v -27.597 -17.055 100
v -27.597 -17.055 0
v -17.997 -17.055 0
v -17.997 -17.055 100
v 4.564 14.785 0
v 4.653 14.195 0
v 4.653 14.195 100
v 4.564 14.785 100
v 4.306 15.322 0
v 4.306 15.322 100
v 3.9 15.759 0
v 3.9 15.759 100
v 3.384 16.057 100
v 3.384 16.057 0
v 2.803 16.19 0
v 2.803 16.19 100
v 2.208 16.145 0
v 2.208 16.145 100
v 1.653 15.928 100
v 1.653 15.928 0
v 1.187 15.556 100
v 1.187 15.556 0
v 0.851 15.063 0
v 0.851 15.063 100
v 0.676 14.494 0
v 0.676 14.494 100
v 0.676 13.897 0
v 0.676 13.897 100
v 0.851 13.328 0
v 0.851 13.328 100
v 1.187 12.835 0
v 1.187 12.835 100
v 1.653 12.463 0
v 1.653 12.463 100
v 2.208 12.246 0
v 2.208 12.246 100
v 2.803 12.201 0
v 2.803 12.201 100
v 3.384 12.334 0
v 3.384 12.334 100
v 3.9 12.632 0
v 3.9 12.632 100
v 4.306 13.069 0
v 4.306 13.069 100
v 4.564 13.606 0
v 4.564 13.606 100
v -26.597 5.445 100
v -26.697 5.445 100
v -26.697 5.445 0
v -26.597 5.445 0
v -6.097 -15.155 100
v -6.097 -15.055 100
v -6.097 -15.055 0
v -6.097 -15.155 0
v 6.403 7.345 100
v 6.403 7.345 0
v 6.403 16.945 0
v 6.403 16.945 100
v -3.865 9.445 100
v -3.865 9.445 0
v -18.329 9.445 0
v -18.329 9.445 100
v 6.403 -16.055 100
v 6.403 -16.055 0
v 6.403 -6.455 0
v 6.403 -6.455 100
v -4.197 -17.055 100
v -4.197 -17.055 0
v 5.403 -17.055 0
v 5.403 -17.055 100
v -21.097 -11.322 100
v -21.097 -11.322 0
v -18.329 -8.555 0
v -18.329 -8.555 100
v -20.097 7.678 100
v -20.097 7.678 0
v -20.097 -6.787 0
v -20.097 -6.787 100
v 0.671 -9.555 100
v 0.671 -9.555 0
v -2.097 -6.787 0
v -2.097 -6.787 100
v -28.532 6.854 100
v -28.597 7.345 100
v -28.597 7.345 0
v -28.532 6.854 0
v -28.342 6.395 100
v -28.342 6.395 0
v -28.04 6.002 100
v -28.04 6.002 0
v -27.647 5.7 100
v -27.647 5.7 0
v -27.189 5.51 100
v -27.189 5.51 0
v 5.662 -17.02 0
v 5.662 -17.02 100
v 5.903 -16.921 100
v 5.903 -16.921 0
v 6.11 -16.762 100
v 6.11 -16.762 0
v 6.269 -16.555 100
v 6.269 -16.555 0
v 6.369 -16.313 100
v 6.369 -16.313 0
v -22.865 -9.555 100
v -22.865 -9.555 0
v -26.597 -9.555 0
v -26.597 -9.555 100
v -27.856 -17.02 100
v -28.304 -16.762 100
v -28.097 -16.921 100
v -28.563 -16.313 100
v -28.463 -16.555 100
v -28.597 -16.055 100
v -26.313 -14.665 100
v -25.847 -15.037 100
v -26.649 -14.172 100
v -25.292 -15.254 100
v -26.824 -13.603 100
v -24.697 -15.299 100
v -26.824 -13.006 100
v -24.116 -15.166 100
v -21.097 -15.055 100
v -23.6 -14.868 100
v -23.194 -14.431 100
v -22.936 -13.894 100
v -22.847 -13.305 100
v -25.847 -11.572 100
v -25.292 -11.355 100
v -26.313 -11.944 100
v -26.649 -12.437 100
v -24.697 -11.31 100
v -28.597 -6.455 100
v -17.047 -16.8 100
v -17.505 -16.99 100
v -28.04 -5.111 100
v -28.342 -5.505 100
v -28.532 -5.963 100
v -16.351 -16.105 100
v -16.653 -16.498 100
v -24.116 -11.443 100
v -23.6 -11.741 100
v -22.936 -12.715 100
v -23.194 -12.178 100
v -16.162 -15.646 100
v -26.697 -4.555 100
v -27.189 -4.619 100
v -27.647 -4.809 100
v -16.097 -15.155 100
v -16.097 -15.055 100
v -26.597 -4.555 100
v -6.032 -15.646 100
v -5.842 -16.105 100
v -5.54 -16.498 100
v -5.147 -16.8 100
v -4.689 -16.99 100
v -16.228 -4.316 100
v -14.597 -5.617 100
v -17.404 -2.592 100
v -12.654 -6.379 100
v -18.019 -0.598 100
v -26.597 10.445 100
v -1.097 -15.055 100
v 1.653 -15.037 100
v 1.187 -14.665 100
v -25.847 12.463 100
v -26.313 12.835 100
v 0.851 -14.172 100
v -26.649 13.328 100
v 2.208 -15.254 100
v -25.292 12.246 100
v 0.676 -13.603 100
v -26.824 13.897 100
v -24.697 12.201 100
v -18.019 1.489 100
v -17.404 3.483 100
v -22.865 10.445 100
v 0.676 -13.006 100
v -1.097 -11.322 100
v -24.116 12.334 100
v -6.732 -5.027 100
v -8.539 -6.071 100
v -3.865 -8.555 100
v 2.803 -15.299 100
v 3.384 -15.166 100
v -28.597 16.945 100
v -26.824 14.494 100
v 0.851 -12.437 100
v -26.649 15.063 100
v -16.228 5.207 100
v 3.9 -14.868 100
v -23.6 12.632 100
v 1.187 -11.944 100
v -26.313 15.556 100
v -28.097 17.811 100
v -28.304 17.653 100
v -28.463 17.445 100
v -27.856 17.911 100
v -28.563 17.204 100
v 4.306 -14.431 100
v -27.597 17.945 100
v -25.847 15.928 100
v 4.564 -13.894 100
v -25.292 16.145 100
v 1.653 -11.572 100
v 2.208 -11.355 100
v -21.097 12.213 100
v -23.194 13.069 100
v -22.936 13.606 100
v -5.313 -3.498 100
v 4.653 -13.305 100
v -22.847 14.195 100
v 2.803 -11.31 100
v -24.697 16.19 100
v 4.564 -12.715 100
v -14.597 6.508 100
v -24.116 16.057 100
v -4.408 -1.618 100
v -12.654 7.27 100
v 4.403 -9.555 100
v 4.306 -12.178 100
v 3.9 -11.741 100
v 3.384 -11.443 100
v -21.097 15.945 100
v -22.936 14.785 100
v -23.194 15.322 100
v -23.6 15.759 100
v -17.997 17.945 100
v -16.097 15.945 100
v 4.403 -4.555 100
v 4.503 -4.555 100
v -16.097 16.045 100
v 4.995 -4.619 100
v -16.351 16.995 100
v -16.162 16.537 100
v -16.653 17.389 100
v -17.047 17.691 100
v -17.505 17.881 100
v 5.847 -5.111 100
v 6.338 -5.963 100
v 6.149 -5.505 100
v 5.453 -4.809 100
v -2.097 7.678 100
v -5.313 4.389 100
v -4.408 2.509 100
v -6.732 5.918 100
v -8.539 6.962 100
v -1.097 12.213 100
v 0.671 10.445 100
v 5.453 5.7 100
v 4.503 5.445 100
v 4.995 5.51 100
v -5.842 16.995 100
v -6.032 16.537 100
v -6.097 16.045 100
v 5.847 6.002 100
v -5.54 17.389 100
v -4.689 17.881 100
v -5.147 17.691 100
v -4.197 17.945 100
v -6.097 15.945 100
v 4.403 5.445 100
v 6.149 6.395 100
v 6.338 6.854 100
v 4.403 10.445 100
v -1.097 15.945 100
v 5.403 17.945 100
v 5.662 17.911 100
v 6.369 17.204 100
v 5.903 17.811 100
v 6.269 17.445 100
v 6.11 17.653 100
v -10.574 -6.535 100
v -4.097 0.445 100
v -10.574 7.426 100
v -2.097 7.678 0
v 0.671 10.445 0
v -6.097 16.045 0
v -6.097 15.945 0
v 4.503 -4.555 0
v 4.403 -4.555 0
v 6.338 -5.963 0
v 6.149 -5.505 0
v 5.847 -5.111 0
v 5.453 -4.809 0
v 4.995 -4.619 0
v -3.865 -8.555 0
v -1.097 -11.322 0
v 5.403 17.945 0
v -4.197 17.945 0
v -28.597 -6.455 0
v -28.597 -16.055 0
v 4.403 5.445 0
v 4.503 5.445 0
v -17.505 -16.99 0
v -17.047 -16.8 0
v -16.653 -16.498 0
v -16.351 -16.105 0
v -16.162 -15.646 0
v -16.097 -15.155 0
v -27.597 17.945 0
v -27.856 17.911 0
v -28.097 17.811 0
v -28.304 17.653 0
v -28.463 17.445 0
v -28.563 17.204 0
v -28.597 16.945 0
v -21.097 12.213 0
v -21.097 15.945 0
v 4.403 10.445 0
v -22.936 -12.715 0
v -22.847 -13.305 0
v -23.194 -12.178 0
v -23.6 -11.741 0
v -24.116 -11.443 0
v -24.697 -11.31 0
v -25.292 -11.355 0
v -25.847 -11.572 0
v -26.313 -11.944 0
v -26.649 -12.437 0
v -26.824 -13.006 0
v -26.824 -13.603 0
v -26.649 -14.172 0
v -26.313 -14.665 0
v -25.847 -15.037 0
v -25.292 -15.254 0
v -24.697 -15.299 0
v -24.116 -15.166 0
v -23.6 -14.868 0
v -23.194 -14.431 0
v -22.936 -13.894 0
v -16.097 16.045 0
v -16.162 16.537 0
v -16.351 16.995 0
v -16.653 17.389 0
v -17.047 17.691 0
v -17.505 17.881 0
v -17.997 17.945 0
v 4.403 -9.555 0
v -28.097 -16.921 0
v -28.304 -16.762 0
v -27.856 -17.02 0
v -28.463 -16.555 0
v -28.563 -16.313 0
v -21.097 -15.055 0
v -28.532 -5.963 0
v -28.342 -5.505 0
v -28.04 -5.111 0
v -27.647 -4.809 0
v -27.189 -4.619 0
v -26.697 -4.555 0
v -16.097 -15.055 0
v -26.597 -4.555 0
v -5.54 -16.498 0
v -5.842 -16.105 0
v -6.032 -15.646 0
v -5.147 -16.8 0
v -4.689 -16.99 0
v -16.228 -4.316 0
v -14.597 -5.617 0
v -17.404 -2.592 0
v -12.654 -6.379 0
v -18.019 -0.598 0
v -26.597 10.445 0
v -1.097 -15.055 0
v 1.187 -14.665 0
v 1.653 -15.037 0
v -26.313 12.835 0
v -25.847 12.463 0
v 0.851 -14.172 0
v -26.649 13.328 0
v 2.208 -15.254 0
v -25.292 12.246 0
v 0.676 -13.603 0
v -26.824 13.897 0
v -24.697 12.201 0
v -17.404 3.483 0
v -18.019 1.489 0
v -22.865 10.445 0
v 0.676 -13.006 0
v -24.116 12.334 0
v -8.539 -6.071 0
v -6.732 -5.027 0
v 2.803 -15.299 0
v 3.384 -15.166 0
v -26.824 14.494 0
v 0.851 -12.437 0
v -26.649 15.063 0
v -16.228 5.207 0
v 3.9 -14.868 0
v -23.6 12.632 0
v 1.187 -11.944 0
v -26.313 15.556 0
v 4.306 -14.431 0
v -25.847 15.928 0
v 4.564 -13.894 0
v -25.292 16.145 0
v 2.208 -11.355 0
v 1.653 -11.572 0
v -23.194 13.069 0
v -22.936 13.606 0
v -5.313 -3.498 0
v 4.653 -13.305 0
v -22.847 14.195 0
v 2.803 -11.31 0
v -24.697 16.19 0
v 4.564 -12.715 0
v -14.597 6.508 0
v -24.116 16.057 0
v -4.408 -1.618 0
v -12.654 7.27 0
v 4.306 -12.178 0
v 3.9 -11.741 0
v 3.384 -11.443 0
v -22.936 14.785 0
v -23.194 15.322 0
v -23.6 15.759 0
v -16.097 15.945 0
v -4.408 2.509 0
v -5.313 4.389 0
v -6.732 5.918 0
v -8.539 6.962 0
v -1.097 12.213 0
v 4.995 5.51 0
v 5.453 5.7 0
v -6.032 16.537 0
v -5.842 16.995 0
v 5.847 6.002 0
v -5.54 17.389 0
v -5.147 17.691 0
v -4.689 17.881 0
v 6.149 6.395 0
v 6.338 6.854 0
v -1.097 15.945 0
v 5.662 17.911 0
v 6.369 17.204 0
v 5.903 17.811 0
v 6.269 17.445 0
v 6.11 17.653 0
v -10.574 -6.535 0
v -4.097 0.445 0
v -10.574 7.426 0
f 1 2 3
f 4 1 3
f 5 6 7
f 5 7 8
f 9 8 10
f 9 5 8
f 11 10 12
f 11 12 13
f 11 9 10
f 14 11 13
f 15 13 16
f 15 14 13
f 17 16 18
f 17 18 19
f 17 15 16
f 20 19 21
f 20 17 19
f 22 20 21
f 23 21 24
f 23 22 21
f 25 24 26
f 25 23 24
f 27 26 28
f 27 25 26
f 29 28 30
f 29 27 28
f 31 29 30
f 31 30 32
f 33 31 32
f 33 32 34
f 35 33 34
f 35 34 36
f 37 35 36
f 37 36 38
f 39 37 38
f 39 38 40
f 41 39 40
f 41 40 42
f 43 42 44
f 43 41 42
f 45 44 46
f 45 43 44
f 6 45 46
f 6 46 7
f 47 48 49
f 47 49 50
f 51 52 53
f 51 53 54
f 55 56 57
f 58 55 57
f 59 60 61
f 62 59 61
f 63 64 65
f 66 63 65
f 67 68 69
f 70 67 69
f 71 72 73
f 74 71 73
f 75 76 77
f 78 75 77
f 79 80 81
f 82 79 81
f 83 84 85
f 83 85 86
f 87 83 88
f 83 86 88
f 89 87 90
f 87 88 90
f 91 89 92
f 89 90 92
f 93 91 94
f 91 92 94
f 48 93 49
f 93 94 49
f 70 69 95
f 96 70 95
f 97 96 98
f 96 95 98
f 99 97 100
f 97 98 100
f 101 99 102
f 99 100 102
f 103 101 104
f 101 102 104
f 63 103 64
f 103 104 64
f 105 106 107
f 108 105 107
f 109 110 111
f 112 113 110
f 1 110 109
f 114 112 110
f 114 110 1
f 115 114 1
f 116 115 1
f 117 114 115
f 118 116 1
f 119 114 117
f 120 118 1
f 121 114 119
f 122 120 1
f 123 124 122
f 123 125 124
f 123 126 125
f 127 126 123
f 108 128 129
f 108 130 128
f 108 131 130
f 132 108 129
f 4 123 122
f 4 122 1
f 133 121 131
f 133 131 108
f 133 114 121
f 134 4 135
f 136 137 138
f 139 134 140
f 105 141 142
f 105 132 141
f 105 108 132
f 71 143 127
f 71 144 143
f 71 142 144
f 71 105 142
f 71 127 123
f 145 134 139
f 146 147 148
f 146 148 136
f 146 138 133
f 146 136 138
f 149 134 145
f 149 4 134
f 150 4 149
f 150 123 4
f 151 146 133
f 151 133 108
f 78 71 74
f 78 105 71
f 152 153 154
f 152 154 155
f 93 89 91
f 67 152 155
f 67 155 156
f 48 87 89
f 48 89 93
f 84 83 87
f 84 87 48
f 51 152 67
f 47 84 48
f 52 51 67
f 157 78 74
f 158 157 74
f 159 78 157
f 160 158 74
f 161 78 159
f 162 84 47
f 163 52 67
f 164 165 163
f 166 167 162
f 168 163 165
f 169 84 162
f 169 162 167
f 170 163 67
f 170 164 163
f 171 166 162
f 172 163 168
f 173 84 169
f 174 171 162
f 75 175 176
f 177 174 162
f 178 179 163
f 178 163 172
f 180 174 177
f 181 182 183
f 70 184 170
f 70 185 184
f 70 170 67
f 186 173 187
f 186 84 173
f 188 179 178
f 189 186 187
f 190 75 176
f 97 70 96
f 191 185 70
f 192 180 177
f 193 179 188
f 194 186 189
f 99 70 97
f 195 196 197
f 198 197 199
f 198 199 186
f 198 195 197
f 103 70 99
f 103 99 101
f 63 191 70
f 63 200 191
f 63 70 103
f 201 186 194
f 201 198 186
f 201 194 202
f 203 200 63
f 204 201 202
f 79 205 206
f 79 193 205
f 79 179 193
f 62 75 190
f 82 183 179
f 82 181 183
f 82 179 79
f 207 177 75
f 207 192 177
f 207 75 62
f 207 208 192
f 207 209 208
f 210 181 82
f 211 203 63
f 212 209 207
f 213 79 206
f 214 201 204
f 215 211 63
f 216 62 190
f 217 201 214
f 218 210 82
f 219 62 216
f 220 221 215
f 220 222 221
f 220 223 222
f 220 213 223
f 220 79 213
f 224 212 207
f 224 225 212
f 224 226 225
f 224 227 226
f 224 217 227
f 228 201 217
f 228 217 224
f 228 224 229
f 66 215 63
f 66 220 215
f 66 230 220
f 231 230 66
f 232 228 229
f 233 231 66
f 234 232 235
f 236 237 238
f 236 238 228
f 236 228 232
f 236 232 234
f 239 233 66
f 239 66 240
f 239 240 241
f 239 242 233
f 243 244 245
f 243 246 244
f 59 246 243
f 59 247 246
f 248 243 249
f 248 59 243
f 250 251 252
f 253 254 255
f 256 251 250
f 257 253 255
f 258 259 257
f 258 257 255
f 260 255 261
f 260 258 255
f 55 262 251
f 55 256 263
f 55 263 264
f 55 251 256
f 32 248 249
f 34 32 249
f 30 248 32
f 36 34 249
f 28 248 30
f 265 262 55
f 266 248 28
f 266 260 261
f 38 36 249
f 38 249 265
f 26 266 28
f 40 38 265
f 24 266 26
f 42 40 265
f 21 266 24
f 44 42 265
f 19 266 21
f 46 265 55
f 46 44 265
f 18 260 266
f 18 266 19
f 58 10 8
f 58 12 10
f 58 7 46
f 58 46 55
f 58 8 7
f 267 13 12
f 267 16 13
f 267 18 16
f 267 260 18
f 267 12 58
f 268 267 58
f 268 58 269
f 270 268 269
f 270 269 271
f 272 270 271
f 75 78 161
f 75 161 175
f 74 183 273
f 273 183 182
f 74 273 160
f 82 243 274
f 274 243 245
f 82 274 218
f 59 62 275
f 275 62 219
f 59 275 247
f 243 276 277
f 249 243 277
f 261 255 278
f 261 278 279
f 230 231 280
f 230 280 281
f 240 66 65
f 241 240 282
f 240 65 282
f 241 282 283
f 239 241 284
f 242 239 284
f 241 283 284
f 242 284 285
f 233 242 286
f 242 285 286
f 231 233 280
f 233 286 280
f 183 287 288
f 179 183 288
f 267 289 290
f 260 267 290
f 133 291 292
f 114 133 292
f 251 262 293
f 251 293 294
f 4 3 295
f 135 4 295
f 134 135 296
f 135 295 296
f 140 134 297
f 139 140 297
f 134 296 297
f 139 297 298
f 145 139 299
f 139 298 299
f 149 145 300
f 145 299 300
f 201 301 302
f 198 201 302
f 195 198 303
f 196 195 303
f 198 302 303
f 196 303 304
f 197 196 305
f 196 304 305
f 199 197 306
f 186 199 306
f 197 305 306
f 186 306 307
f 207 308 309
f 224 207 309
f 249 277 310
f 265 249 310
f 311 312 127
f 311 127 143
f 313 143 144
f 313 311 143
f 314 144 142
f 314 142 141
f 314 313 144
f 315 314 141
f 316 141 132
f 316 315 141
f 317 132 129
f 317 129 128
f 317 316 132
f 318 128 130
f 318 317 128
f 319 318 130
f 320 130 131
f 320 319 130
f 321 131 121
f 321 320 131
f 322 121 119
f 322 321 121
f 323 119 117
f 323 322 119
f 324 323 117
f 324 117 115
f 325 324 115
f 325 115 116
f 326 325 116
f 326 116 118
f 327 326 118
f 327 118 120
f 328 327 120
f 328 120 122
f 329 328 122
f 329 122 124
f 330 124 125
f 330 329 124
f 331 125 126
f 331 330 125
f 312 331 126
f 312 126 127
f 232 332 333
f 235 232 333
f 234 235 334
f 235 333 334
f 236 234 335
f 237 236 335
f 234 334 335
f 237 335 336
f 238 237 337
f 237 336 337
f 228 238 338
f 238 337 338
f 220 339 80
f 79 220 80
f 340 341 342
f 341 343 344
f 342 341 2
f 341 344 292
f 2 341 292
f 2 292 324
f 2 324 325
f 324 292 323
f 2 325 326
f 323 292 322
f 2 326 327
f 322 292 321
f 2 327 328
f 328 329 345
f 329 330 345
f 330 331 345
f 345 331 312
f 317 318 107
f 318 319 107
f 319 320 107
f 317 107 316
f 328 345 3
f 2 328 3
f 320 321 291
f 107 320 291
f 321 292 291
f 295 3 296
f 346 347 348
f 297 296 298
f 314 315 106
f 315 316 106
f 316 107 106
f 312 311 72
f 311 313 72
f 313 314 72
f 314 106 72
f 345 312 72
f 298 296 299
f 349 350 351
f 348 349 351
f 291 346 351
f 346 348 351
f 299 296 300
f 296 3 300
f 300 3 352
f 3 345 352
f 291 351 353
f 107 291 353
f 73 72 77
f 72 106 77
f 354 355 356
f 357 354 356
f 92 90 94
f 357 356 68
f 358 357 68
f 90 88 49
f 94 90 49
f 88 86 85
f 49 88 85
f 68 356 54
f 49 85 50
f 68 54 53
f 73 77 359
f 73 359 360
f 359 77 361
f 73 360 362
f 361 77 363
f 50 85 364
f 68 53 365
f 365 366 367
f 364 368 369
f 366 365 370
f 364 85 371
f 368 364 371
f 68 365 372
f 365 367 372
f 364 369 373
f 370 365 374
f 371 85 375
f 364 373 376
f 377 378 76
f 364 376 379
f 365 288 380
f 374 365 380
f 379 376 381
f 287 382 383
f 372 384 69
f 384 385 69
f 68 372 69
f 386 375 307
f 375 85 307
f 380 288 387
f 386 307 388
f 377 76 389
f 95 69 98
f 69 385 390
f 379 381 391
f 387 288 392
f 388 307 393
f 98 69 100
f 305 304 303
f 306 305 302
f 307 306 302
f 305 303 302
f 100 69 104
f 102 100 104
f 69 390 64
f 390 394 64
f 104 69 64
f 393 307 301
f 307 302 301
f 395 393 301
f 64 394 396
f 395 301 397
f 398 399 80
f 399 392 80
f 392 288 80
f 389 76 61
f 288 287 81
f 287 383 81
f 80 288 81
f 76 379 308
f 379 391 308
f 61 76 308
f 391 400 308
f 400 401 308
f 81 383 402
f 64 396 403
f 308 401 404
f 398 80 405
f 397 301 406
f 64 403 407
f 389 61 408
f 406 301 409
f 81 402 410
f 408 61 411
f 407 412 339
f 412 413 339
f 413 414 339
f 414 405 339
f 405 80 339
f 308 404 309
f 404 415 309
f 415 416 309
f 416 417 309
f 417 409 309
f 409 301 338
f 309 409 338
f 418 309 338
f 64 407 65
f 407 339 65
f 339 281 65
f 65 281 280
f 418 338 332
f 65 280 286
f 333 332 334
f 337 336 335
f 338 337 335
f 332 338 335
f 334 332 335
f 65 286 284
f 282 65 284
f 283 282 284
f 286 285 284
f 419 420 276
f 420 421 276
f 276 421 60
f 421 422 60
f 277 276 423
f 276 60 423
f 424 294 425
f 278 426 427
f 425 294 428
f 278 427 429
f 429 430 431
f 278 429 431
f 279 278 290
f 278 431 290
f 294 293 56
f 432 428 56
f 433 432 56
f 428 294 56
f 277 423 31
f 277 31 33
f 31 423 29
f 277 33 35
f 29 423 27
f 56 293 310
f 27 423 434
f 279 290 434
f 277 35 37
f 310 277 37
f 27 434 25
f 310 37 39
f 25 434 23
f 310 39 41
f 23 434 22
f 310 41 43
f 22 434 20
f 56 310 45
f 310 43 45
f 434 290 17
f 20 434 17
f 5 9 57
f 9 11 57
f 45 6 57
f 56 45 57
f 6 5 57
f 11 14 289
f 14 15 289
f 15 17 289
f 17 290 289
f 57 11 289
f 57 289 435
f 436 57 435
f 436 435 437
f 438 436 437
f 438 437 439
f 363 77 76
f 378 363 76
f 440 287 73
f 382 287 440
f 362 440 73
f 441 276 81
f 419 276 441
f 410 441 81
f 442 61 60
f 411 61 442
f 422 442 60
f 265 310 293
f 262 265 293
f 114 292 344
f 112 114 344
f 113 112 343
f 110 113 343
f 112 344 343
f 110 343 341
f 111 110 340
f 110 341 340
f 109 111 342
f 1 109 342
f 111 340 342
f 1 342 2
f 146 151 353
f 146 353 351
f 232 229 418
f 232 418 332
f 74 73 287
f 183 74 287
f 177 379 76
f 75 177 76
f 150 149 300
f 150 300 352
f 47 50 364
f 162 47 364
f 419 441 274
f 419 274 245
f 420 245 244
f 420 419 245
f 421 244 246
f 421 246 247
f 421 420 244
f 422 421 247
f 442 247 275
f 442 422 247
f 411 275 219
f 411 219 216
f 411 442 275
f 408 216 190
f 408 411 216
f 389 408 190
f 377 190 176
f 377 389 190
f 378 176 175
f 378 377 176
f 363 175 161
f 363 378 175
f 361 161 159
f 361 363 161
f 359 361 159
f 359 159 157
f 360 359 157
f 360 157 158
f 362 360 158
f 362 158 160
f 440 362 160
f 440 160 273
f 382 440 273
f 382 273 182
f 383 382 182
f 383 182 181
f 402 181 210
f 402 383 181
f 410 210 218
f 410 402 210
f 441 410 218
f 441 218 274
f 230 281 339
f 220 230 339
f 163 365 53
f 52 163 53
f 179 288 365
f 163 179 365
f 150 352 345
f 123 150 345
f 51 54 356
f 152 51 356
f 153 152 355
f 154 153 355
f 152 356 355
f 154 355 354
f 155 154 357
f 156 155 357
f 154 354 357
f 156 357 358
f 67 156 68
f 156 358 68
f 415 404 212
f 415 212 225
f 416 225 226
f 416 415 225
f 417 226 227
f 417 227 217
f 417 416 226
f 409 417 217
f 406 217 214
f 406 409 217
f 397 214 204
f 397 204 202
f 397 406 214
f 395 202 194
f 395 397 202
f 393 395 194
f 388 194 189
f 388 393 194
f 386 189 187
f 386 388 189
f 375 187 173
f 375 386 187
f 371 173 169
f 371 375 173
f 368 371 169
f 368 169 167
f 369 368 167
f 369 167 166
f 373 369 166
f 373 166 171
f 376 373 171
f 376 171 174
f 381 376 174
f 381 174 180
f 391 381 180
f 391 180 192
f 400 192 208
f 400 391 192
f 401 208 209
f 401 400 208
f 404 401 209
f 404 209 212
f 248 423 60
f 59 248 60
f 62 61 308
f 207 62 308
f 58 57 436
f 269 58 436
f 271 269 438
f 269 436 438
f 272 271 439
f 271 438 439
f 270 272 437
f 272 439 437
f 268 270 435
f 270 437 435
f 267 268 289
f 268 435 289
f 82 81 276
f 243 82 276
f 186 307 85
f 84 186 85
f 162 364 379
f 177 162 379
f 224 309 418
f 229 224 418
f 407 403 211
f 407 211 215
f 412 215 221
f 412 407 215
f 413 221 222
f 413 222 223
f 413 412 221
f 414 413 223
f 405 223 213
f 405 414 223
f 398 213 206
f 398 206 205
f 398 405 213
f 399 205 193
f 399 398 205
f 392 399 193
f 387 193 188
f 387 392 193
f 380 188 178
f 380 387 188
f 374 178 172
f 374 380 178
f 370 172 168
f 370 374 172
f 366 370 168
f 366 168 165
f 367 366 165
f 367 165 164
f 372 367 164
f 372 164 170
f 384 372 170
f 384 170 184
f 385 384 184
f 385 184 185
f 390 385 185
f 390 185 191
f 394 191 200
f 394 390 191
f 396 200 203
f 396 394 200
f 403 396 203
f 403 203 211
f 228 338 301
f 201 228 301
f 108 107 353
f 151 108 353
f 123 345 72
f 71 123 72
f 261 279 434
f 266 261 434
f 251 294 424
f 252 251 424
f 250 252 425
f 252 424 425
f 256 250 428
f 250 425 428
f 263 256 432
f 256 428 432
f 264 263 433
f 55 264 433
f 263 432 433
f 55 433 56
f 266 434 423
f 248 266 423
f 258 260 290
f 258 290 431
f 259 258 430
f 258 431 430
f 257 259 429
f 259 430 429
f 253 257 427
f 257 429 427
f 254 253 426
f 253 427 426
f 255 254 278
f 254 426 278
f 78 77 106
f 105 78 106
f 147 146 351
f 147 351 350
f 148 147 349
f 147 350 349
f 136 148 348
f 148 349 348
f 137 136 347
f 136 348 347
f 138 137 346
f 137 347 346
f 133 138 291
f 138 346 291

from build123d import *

# Parameters (mm, degrees)
SKETCH_1_R      = 7
SKETCH_1_R_2    = 2
EXTRUDE_1_DEPTH = 100


with BuildPart() as part:
    # 草图1 → 凸台-拉伸1 (new body)
    with BuildSketch(Plane.XY):
        with BuildLine():
            Line((-16.096789658, 15.945460798), (-16.096789658, 16.045460798))
            ThreePointArc((-16.096789658, 16.045460798), (-16.653286773, 17.388963682), (-17.996789658, 17.945460798))
            Line((-17.996789658, 17.945460798), (-27.596789658, 17.945460798))
            ThreePointArc((-27.596789658, 17.945460798), (-28.303896439, 17.652567579), (-28.596789658, 16.945460798))
            Line((-28.596789658, 16.945460798), (-28.596789658, 7.345460798))
            ThreePointArc((-28.596789658, 7.345460798), (-28.040292542, 6.001957914), (-26.696789658, 5.445460798))
            Line((-26.696789658, 5.445460798), (-26.596789658, 5.445460798))
            Line((-26.596789658, 5.445460798), (-26.596789658, 10.445460798))
            Line((-26.596789658, 10.445460798), (-22.864556611, 10.445460798))
            Line((-22.864556611, 10.445460798), (-20.096789658, 7.677693845))
            Line((-20.096789658, 7.677693845), (-20.096789658, -6.786772249))
            Line((-20.096789658, -6.786772249), (-22.864556611, -9.554539202))
            Line((-22.864556611, -9.554539202), (-26.596789658, -9.554539202))
            Line((-26.596789658, -9.554539202), (-26.596789658, -4.554539202))
            Line((-26.596789658, -4.554539202), (-26.696789658, -4.554539202))
            ThreePointArc((-26.696789658, -4.554539202), (-28.040292542, -5.111036318), (-28.596789658, -6.454539202))
            Line((-28.596789658, -6.454539202), (-28.596789658, -16.054539202))
            ThreePointArc((-28.596789658, -16.054539202), (-28.303896439, -16.761645983), (-27.596789658, -17.054539202))
            Line((-27.596789658, -17.054539202), (-17.996789658, -17.054539202))
            ThreePointArc((-17.996789658, -17.054539202), (-16.653286773, -16.498042086), (-16.096789658, -15.154539202))
            Line((-16.096789658, -15.154539202), (-16.096789658, -15.054539202))
            Line((-16.096789658, -15.054539202), (-21.096789658, -15.054539202))
            Line((-21.096789658, -15.054539202), (-21.096789658, -11.322306155))
            Line((-21.096789658, -11.322306155), (-18.329022705, -8.554539202))
            Line((-18.329022705, -8.554539202), (-3.864556611, -8.554539202))
            Line((-3.864556611, -8.554539202), (-1.096789658, -11.322306155))
            Line((-1.096789658, -11.322306155), (-1.096789658, -15.054539202))
            Line((-1.096789658, -15.054539202), (-6.096789658, -15.054539202))
            Line((-6.096789658, -15.054539202), (-6.096789658, -15.154539202))
            ThreePointArc((-6.096789658, -15.154539202), (-5.540292542, -16.498042086), (-4.196789658, -17.054539202))
            Line((-4.196789658, -17.054539202), (5.403210342, -17.054539202))
            ThreePointArc((5.403210342, -17.054539202), (6.110317124, -16.761645983), (6.403210342, -16.054539202))
            Line((6.403210342, -16.054539202), (6.403210342, -6.454539202))
            ThreePointArc((6.403210342, -6.454539202), (5.846713227, -5.111036318), (4.503210342, -4.554539202))
            Line((4.503210342, -4.554539202), (4.403210342, -4.554539202))
            Line((4.403210342, -4.554539202), (4.403210342, -9.554539202))
            Line((4.403210342, -9.554539202), (0.670977295, -9.554539202))
            Line((0.670977295, -9.554539202), (-2.096789658, -6.786772249))
            Line((-2.096789658, -6.786772249), (-2.096789658, 7.677693845))
            Line((-2.096789658, 7.677693845), (0.670977295, 10.445460798))
            Line((0.670977295, 10.445460798), (4.403210342, 10.445460798))
            Line((4.403210342, 10.445460798), (4.403210342, 5.445460798))
            Line((4.403210342, 5.445460798), (4.503210342, 5.445460798))
            ThreePointArc((4.503210342, 5.445460798), (5.846713227, 6.001957914), (6.403210342, 7.345460798))
            Line((6.403210342, 7.345460798), (6.403210342, 16.945460798))
            ThreePointArc((6.403210342, 16.945460798), (6.110317124, 17.652567579), (5.403210342, 17.945460798))
            Line((5.403210342, 17.945460798), (-4.196789658, 17.945460798))
            ThreePointArc((-4.196789658, 17.945460798), (-5.540292542, 17.388963682), (-6.096789658, 16.045460798))
            Line((-6.096789658, 16.045460798), (-6.096789658, 15.945460798))
            Line((-6.096789658, 15.945460798), (-1.096789658, 15.945460798))
            Line((-1.096789658, 15.945460798), (-1.096789658, 12.213227751))
            Line((-1.096789658, 12.213227751), (-3.864556611, 9.445460798))
            Line((-3.864556611, 9.445460798), (-18.329022705, 9.445460798))
            Line((-18.329022705, 9.445460798), (-21.096789658, 12.213227751))
            Line((-21.096789658, 12.213227751), (-21.096789658, 15.945460798))
            Line((-21.096789658, 15.945460798), (-16.096789658, 15.945460798))
        make_face()
        with Locations((-11.096789658, 0.445460798)):
            Circle(SKETCH_1_R, mode=Mode.SUBTRACT)
        with Locations((-24.846789658, 14.195460798)):
            Circle(SKETCH_1_R_2, mode=Mode.SUBTRACT)
        with Locations((2.653210342, 14.195460798)):
            Circle(SKETCH_1_R_2, mode=Mode.SUBTRACT)
        with Locations((-24.846789658, -13.304539202)):
            Circle(SKETCH_1_R_2, mode=Mode.SUBTRACT)
        with Locations((2.653210342, -13.304539202)):
            Circle(SKETCH_1_R_2, mode=Mode.SUBTRACT)
    extrude(amount=EXTRUDE_1_DEPTH)


solid = part.part
